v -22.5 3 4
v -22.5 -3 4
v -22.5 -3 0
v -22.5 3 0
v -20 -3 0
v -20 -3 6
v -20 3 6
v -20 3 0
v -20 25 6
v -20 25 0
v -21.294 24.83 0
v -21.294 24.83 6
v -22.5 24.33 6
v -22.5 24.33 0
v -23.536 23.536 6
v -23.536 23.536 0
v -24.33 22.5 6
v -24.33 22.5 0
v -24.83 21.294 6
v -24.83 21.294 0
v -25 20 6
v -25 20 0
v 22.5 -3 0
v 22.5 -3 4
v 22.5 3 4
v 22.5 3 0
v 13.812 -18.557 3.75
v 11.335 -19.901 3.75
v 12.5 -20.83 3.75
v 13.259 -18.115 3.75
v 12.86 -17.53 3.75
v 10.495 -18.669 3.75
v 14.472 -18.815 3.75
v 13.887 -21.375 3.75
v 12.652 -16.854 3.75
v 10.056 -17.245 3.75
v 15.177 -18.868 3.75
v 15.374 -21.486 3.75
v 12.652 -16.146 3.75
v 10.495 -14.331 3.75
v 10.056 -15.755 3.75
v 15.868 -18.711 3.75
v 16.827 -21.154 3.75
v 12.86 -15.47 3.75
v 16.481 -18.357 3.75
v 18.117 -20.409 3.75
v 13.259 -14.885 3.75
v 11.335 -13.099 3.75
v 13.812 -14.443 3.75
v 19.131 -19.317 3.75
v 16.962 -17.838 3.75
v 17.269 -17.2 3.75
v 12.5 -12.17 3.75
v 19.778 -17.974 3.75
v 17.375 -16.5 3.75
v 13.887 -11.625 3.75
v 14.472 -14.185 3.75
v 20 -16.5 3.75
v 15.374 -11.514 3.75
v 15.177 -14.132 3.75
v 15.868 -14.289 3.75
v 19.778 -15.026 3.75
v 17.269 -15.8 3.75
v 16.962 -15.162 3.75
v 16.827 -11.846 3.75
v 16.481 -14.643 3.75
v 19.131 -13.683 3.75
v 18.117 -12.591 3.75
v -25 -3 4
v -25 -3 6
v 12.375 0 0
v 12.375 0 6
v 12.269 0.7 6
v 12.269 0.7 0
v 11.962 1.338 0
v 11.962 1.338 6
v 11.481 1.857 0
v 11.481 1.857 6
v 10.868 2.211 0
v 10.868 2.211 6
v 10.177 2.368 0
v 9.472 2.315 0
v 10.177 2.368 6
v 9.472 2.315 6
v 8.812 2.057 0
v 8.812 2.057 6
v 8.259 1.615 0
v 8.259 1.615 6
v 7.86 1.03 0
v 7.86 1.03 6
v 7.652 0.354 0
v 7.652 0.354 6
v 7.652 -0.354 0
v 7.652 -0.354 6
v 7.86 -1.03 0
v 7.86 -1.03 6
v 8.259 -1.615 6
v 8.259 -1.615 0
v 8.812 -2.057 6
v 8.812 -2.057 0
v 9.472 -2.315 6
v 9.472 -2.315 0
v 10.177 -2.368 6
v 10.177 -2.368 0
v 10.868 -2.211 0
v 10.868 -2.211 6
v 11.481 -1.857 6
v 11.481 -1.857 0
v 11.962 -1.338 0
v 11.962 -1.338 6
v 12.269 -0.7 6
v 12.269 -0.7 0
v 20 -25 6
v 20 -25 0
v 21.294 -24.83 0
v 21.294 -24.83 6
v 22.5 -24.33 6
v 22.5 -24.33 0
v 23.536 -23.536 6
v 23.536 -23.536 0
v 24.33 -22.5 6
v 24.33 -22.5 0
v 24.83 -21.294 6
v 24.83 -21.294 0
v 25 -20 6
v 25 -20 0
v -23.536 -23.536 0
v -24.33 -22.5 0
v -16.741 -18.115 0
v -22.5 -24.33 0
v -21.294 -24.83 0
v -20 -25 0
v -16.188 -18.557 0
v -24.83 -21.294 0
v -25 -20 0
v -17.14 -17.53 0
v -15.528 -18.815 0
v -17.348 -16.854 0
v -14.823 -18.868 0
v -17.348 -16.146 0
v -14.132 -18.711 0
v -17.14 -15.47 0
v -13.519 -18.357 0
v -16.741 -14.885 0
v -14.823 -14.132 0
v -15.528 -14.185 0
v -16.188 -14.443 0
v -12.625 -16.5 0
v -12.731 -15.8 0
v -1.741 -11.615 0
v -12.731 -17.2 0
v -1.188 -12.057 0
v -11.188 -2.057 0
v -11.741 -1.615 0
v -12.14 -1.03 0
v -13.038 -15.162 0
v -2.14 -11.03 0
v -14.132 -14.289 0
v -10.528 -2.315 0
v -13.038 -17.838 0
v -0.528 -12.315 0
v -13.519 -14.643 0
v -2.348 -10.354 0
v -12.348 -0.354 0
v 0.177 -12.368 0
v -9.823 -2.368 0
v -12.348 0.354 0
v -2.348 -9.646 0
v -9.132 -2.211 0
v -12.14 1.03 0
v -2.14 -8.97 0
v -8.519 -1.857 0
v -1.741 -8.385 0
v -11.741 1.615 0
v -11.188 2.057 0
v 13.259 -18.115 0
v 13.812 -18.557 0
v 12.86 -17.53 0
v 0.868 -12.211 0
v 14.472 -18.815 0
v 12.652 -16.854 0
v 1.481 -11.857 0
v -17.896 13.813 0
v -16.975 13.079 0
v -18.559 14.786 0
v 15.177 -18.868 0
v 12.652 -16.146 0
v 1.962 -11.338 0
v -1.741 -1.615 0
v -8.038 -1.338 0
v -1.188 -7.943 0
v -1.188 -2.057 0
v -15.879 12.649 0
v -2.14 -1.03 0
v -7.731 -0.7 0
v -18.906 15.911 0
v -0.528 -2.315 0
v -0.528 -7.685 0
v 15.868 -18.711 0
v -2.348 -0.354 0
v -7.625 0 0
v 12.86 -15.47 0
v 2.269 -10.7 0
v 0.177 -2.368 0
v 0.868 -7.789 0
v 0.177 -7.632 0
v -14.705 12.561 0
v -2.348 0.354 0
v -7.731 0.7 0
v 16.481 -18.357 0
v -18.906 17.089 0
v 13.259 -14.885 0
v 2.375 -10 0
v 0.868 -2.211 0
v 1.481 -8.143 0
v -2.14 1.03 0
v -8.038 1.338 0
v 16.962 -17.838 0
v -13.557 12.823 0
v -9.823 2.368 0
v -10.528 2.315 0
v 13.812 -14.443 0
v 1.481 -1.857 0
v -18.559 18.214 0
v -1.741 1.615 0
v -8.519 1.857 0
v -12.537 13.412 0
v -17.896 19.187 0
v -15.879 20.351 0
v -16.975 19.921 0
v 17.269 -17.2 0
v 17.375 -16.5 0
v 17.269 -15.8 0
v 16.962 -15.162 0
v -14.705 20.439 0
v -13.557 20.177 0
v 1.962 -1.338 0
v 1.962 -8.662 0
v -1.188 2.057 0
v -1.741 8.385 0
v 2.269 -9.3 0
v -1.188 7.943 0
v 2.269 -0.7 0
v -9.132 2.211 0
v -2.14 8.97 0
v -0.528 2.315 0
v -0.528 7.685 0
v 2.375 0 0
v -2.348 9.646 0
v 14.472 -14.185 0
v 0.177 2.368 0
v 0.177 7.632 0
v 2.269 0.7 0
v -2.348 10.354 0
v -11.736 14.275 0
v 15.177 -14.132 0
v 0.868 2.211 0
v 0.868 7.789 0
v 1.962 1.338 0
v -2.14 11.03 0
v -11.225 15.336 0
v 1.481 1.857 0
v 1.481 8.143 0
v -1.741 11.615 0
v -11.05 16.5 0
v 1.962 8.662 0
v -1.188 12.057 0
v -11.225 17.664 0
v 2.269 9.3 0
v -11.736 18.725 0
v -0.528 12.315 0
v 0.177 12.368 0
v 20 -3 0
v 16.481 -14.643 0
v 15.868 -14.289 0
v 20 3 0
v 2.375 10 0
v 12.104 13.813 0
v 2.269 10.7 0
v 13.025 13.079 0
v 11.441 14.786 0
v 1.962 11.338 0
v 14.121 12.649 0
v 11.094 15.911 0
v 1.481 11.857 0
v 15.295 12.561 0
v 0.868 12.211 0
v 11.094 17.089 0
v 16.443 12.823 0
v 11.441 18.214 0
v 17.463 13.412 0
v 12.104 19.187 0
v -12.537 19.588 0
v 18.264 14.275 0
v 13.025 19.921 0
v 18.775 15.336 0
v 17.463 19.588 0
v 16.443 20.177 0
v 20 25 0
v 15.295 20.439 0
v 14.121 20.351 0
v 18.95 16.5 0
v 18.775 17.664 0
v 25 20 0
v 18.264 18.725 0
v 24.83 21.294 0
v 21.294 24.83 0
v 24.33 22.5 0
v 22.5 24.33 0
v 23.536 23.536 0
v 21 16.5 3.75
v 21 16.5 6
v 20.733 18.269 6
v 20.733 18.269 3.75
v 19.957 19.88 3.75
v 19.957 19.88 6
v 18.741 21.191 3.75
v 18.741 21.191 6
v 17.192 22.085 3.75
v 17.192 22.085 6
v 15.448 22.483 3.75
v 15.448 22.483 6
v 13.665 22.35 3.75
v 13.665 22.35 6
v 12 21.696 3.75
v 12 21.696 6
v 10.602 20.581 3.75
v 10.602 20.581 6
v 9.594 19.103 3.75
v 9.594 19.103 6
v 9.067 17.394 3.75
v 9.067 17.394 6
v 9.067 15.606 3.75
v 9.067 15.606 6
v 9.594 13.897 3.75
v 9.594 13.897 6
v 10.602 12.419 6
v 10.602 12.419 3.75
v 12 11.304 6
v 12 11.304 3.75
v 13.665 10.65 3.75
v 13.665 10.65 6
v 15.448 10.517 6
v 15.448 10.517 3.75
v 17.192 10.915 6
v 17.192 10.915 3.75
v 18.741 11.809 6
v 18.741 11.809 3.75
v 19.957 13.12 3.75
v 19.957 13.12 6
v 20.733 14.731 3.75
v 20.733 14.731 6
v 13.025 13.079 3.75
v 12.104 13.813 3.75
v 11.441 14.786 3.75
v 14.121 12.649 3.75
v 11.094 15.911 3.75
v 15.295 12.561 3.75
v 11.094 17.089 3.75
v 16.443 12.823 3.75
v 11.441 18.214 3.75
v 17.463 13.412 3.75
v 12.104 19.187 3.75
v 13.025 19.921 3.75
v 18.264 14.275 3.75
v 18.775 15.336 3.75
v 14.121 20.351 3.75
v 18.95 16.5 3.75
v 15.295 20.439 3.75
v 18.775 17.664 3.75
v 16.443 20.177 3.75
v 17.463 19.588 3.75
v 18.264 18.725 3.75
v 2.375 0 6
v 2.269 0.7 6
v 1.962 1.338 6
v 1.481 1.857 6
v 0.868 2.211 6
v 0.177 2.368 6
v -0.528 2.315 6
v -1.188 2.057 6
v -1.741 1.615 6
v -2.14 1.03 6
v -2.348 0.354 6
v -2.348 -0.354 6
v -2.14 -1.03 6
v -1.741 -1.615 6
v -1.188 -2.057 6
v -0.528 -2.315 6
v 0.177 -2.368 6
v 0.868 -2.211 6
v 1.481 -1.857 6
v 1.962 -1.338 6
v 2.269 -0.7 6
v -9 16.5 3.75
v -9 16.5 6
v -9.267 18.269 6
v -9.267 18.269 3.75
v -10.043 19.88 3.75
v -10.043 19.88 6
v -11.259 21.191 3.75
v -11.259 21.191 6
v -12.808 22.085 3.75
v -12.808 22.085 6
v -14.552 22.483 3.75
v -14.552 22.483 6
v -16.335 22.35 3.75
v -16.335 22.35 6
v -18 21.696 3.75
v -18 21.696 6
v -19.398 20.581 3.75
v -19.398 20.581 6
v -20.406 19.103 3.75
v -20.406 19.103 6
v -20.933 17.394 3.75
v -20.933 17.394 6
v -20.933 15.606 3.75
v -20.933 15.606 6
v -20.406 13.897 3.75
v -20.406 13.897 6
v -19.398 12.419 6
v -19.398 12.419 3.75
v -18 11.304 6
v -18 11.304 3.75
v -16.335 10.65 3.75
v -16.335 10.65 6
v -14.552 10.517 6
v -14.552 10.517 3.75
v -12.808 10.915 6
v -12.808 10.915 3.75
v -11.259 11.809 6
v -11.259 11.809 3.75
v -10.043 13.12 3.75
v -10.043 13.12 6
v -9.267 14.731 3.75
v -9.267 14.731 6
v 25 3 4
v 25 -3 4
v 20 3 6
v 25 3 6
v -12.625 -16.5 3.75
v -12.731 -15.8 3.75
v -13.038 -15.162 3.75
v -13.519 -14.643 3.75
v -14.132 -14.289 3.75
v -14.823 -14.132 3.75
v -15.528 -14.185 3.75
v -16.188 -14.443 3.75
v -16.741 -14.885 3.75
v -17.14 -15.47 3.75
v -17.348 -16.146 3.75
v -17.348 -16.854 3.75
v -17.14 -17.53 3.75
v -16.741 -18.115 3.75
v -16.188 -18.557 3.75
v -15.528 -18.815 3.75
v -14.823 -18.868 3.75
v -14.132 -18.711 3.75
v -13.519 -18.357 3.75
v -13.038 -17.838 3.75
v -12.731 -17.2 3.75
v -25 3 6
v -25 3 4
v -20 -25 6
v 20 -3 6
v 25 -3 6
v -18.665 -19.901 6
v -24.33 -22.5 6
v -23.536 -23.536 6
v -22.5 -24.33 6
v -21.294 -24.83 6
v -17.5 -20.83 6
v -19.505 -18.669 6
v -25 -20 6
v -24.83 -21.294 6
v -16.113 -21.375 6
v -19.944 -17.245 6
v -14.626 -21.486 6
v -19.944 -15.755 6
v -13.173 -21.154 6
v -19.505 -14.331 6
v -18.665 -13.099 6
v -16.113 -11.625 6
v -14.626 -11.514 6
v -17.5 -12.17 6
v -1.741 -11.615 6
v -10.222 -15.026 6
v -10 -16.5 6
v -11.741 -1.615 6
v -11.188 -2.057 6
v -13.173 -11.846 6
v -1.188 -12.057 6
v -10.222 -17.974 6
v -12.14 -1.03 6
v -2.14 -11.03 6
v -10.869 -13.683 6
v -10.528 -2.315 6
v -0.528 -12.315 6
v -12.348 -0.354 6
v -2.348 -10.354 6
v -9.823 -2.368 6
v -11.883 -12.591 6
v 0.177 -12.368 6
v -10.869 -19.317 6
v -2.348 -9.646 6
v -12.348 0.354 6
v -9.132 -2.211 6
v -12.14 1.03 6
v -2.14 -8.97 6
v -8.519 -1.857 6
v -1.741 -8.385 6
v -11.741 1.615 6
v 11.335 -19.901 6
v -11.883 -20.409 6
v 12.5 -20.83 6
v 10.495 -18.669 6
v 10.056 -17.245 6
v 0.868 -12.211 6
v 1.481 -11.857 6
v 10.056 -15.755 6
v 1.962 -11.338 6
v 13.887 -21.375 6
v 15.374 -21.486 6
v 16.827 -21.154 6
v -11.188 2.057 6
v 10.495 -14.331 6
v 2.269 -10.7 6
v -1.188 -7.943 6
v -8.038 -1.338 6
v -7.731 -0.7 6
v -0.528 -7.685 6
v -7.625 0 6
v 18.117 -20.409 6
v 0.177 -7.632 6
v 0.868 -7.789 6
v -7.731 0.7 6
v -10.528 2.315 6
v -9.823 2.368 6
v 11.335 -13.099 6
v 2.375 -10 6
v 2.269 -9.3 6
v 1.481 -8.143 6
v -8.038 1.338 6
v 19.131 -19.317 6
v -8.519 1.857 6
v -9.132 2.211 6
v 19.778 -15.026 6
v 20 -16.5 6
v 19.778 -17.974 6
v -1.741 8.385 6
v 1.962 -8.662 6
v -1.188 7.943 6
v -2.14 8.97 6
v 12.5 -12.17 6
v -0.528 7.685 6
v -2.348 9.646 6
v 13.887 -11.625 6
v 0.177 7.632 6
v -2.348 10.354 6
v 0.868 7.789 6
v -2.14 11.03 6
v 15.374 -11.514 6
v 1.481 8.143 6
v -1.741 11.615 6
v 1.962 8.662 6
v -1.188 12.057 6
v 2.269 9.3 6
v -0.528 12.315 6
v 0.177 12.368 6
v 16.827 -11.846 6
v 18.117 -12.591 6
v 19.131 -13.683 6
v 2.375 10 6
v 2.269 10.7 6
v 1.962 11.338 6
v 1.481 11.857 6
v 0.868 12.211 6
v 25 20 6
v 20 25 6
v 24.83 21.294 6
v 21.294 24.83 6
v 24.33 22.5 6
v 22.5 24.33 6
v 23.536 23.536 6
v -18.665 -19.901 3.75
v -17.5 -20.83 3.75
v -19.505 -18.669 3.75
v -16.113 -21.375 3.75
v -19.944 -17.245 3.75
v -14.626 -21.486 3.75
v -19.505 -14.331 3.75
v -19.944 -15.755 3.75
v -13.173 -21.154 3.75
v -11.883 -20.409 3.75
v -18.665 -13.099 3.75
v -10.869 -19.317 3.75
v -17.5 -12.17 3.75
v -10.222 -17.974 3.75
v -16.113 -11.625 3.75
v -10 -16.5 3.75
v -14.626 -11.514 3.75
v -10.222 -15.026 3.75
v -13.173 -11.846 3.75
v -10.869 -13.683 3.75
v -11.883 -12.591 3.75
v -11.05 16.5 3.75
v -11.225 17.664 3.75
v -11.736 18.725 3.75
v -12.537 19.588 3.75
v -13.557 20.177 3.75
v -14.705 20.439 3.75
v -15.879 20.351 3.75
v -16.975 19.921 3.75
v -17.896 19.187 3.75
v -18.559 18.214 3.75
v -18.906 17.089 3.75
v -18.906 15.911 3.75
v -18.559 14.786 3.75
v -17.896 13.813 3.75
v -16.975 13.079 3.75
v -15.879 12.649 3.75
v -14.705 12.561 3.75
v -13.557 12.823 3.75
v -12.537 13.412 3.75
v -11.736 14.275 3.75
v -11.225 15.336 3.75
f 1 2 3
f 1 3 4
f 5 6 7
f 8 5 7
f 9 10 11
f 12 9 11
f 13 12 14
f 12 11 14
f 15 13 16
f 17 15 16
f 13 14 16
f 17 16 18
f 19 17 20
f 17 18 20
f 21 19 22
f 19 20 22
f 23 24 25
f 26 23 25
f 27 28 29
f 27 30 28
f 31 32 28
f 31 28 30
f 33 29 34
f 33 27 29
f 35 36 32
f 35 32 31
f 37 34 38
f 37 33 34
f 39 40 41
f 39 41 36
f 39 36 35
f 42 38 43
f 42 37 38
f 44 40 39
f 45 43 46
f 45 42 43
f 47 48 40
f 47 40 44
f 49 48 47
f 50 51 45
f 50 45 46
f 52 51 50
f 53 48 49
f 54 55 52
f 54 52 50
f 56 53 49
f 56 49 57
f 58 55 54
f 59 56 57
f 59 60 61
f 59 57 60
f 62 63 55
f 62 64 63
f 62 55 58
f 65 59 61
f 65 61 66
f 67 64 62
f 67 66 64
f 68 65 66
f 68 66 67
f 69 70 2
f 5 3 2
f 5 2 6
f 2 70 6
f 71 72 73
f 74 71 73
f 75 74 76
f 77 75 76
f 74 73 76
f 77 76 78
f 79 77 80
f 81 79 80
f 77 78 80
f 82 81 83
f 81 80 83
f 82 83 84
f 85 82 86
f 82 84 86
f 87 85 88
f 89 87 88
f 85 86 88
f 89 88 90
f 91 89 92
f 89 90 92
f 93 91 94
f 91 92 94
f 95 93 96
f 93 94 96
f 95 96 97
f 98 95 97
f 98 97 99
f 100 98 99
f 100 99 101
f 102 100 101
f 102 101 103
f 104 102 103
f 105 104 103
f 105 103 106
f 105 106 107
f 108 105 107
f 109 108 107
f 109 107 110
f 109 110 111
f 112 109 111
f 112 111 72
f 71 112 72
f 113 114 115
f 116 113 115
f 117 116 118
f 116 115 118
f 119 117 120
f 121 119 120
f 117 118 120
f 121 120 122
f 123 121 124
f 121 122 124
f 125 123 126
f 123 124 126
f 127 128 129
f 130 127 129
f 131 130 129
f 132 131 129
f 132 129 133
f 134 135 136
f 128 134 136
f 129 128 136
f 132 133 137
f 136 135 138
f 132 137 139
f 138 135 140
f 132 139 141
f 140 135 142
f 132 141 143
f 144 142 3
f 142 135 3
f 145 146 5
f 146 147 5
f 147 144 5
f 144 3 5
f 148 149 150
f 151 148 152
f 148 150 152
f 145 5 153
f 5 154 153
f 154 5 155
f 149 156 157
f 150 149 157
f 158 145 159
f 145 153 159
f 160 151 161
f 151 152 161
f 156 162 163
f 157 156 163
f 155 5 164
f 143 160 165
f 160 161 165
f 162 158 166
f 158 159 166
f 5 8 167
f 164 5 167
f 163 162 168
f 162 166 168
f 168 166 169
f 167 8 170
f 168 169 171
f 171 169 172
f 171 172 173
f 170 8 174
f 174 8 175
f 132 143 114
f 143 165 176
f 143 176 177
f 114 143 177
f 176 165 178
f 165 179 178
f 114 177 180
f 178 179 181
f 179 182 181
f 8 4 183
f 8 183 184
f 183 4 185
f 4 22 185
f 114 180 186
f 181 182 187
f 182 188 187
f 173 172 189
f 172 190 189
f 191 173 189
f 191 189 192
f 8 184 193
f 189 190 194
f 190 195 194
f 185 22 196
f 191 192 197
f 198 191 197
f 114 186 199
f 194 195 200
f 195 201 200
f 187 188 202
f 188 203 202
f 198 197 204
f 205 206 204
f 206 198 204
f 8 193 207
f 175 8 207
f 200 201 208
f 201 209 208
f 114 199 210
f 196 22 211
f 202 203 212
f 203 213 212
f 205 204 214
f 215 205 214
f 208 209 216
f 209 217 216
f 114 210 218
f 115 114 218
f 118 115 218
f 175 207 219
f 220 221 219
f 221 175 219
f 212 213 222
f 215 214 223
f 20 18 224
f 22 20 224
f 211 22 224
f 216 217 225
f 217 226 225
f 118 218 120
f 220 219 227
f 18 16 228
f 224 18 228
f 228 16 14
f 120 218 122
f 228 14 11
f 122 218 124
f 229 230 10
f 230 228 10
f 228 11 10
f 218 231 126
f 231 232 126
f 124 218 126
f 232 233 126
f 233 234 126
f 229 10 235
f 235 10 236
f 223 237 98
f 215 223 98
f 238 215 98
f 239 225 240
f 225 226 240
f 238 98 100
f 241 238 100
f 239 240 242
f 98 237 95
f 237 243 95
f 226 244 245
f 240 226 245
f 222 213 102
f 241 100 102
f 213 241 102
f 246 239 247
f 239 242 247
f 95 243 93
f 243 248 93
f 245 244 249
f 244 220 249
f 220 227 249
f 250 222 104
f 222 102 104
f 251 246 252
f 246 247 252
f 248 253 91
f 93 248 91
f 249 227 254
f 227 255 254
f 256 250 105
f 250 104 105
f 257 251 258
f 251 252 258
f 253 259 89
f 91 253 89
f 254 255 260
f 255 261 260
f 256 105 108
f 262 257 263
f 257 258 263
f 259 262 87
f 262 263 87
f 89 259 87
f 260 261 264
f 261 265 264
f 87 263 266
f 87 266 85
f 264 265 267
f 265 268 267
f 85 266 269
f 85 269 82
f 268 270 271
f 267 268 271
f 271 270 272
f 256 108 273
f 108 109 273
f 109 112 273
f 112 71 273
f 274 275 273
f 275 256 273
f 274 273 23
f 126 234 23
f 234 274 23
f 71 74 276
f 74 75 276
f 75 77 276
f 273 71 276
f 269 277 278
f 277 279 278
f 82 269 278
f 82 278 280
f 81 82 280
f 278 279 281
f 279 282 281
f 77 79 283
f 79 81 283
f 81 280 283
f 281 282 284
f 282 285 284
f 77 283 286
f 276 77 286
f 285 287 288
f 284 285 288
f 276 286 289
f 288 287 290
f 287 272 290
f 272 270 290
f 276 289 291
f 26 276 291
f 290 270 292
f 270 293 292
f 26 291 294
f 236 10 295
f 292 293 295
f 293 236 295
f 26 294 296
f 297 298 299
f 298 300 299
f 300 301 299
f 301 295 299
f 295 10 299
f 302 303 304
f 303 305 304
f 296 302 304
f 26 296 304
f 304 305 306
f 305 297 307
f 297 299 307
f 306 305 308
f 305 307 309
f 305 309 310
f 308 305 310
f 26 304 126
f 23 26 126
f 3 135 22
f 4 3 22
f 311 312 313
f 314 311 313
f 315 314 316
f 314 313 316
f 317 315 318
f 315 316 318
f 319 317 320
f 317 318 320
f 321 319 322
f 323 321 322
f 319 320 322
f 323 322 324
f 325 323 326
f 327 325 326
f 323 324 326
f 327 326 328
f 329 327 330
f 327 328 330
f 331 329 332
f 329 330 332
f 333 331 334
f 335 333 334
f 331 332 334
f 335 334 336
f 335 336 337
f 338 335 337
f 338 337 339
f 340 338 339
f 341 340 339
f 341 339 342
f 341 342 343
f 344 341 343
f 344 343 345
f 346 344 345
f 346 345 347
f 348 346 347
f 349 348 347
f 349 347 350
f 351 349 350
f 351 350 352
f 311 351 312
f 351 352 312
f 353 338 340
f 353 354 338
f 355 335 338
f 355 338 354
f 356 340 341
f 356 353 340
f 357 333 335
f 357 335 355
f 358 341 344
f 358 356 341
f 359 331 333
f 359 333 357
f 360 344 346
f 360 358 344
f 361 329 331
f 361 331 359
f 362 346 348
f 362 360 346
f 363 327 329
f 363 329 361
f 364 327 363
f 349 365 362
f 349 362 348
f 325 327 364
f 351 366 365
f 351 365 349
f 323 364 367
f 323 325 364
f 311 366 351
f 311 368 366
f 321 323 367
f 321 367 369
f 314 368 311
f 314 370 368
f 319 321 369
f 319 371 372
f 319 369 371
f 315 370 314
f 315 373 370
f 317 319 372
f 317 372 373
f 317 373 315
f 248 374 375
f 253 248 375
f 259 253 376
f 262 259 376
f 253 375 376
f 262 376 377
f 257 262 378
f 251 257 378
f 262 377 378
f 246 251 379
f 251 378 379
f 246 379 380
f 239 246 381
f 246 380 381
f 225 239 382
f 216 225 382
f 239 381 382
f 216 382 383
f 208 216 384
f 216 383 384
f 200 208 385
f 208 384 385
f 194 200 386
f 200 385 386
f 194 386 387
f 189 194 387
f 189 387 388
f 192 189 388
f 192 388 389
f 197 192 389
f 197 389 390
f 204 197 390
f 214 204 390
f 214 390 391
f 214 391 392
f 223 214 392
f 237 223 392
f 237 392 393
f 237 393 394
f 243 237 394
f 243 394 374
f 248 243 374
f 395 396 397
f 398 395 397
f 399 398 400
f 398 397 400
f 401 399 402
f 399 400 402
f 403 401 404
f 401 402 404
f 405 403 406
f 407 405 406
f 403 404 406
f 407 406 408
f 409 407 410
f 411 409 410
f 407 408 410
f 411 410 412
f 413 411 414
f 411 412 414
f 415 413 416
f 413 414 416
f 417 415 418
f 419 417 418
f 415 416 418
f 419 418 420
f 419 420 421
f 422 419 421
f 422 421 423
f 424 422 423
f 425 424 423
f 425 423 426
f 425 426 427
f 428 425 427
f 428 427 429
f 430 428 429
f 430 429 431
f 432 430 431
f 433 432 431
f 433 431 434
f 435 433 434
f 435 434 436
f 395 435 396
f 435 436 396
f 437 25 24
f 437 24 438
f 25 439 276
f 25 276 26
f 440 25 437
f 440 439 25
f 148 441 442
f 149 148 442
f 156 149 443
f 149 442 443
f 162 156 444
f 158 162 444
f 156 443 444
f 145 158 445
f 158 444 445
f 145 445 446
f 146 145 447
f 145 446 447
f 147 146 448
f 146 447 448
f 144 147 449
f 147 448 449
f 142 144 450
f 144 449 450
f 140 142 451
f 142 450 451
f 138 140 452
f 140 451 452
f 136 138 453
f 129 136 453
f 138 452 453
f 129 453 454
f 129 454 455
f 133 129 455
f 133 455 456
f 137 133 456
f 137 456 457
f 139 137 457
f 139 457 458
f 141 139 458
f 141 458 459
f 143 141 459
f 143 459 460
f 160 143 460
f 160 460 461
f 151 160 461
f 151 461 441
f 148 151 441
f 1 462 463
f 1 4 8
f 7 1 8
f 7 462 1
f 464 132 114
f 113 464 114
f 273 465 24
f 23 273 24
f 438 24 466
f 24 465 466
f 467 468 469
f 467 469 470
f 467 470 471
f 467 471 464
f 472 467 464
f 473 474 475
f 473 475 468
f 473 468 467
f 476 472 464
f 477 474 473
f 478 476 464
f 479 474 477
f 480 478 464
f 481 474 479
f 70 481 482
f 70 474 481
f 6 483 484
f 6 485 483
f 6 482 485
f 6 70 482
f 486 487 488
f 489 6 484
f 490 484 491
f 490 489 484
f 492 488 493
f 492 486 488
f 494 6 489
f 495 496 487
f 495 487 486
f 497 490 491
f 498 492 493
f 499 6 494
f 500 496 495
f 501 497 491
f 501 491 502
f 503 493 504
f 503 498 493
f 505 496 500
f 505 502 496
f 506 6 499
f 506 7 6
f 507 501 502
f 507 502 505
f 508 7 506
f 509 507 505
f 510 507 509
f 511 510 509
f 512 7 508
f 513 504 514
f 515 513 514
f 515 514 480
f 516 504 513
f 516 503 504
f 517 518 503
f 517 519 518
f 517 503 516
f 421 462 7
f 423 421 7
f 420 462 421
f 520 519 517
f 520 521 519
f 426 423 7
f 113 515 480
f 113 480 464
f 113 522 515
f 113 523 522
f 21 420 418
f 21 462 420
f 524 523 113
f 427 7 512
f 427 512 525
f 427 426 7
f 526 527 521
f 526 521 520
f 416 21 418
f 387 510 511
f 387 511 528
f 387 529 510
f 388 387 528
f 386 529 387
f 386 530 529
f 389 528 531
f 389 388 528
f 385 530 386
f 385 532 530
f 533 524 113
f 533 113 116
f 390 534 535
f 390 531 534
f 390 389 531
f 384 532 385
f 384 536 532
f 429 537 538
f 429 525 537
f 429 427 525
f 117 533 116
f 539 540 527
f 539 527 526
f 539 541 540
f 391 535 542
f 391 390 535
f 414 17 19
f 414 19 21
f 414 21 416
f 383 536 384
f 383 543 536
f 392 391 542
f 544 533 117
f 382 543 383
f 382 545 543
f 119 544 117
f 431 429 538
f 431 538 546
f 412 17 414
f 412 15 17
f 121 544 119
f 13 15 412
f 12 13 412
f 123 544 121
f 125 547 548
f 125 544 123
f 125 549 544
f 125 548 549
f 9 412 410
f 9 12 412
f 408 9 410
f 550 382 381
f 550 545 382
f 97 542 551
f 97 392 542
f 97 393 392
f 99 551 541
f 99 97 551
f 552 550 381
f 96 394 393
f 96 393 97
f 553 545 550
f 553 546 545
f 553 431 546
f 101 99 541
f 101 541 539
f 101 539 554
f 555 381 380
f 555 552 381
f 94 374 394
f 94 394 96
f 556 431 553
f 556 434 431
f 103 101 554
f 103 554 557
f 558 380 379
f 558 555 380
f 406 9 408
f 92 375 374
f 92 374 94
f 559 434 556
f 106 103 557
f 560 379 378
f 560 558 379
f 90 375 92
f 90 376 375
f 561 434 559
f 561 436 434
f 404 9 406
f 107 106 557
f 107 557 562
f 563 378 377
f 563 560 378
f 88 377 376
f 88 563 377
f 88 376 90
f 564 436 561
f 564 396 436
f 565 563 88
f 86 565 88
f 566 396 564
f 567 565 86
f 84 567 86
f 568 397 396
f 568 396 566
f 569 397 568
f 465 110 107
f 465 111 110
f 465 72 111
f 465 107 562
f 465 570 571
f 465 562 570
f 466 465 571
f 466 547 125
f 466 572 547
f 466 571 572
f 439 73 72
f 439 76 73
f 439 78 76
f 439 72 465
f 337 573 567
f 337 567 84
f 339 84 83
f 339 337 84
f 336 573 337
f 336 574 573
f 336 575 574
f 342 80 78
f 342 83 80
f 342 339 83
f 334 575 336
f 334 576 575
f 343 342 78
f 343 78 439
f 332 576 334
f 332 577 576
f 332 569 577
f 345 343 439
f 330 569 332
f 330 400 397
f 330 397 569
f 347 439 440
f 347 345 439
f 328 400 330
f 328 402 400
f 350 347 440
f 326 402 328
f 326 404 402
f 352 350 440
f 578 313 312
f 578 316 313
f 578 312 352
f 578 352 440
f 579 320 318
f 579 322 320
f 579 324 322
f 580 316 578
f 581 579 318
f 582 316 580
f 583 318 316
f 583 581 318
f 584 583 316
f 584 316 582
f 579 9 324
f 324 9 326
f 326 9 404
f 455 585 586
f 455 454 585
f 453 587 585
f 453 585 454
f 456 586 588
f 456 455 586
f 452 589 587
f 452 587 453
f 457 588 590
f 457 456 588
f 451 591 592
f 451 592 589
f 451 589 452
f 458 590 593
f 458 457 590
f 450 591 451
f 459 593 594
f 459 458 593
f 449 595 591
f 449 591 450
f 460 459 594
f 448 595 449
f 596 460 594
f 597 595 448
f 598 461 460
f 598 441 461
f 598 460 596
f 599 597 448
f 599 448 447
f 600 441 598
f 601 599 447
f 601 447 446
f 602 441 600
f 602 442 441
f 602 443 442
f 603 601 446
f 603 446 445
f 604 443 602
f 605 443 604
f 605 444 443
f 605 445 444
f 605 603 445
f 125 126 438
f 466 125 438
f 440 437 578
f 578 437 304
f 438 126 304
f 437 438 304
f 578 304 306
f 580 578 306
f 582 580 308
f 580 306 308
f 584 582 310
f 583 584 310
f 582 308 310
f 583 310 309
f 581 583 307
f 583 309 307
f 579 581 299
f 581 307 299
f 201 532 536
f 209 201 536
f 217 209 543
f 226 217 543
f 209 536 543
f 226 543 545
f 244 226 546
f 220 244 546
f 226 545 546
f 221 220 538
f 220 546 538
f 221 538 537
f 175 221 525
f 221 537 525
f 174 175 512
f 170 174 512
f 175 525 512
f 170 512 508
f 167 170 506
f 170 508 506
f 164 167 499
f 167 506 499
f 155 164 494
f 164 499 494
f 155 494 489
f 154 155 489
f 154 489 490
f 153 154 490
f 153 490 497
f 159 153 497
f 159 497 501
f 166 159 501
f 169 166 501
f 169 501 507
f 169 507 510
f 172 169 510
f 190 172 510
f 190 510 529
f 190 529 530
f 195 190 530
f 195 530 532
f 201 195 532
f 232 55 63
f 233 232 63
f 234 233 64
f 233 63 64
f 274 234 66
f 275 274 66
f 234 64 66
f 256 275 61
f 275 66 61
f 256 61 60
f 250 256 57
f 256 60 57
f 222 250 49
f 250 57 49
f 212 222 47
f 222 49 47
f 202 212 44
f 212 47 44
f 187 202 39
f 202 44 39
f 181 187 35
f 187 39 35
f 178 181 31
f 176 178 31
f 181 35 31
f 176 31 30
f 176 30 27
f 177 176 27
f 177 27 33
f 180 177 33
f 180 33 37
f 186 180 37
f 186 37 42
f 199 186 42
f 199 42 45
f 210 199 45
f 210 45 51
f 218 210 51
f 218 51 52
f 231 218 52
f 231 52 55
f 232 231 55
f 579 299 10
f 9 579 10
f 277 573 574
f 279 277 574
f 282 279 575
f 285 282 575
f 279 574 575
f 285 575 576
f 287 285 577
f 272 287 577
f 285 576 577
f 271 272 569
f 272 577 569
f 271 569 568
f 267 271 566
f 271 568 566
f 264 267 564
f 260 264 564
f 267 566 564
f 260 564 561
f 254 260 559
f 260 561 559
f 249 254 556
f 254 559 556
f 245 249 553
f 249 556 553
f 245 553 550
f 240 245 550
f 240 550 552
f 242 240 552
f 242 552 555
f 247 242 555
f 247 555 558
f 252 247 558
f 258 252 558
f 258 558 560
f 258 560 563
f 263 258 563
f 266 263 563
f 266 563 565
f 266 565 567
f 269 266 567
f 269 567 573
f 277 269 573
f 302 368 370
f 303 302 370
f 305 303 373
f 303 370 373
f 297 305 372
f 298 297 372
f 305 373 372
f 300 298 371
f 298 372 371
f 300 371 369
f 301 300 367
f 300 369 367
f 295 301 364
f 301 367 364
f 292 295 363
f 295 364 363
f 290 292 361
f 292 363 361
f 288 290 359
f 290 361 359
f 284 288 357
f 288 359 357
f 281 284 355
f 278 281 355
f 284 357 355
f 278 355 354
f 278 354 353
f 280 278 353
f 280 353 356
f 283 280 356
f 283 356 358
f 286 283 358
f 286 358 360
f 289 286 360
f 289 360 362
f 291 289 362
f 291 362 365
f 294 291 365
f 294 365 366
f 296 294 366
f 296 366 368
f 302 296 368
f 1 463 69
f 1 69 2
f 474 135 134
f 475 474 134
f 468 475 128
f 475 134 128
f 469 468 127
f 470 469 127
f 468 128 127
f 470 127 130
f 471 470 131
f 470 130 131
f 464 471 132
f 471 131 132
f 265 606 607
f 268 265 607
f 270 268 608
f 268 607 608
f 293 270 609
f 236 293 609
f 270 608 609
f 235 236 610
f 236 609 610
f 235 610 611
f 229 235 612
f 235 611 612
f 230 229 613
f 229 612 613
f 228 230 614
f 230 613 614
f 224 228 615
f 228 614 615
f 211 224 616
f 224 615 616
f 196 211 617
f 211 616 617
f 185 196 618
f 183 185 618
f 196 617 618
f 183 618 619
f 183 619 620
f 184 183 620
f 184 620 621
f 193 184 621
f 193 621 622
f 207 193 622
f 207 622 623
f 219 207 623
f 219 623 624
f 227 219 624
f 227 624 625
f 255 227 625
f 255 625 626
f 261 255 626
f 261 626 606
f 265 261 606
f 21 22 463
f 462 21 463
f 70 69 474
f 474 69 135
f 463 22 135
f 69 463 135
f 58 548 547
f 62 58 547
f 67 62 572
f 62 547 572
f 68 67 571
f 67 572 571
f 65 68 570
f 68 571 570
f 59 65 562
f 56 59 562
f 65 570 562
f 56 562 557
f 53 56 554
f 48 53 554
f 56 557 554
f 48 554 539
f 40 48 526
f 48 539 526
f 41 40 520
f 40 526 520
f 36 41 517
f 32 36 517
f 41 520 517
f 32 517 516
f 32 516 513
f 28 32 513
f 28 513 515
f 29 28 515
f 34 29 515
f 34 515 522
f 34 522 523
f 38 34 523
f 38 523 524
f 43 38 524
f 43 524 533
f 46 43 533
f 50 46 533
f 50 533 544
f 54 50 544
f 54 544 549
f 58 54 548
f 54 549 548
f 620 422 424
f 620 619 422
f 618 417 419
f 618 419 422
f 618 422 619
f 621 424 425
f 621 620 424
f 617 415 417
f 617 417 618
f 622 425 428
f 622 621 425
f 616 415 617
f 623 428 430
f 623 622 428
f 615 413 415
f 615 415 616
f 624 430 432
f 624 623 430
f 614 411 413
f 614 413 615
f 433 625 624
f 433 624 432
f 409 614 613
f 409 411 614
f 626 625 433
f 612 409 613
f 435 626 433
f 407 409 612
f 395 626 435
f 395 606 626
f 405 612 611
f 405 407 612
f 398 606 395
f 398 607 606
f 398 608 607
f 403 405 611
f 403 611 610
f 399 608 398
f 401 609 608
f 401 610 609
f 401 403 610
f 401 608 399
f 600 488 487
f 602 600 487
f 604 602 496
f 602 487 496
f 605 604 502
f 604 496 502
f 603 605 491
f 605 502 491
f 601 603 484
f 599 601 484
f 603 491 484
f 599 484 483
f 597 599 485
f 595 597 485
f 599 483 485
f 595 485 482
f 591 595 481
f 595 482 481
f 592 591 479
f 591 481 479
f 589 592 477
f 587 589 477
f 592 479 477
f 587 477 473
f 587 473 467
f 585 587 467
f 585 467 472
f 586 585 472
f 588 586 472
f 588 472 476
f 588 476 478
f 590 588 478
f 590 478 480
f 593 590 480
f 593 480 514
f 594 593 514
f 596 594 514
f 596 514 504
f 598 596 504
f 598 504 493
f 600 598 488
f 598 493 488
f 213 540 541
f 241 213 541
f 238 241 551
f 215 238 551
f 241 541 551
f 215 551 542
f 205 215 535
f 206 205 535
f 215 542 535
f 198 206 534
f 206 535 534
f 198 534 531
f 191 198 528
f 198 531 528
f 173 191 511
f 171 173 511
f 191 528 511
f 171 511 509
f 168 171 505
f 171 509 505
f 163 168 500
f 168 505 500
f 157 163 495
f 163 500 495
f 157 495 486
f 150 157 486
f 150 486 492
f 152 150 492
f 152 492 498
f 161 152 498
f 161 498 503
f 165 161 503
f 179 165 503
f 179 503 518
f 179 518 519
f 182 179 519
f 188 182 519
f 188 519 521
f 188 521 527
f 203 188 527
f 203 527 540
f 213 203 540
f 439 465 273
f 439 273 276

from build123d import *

# Parameters (mm, degrees)
F1_DEPTH  = 6
F2_W      = 2.5
F2_H      = 6
F3_DEPTH  = 2
F4_W      = 2.5
F4_H      = 6
F5_DEPTH  = 25
F6_R      = 2.375
F7_DEPTH  = 25
F8_R      = 2.375
F9_DEPTH  = 25
F10_R     = 6
F10_R_2   = 5
F11_DEPTH = 2.25
F12_R     = 3.95
F13_DEPTH = 25


with BuildPart() as f1:
    # F0 (on Top) → F1 (new body)
    with BuildSketch(Plane.XY):
        with BuildLine():
            ThreePointArc((-25, -20), (-23.535534, -23.535534), (-20, -25))
            Line((-20, -25), (20, -25))
            ThreePointArc((20, -25), (23.535534, -23.535534), (25, -20))
            Line((25, -20), (25, 20))
            ThreePointArc((25, 20), (23.535534, 23.535534), (20, 25))
            Line((20, 25), (-20, 25))
            ThreePointArc((-20, 25), (-23.535534, 23.535534), (-25, 20))
            Line((-25, 20), (-25, -20))
        make_face()
    extrude(amount=F1_DEPTH)

    # F2 (on face) → F3 (cut)
    with BuildSketch(Plane.XY.offset(6)):
        with Locations((-23.75, 0)):
            Rectangle(F2_W, F2_H)
        with Locations((23.75, 0)):
            Rectangle(F2_W, F2_H)
    extrude(amount=-F3_DEPTH, mode=Mode.SUBTRACT)

    # F4 (on face) → F5 (cut)
    with BuildSketch(Plane.XY.offset(6)):
        with Locations((-21.25, 0)):
            Rectangle(F4_W, F4_H)
        with Locations((21.25, 0)):
            Rectangle(F4_W, F4_H)
    extrude(amount=-F5_DEPTH, mode=Mode.SUBTRACT)

    # F6 (on face) → F7 (cut)
    with BuildSketch(Plane.XY.offset(6)):
        Circle(F6_R)
        with Locations((-10, 0)):
            Circle(F6_R)
        with Locations((0, -10)):
            Circle(F6_R)
        with Locations((10, 0)):
            Circle(F6_R)
        with Locations((0, 10)):
            Circle(F6_R)
    extrude(amount=-F7_DEPTH, mode=Mode.SUBTRACT)

    # F8 (on face) → F9 (cut)
    with BuildSketch(Plane.XY.offset(6)):
        with Locations((-15, -16.5)):
            Circle(F8_R)
        with Locations((15, -16.5)):
            Circle(F8_R)
        with Locations((-15, 16.5)):
            Circle(F8_R)
        with Locations((15, 16.5)):
            Circle(F8_R)
    extrude(amount=-F9_DEPTH, mode=Mode.SUBTRACT)

    # F10 (on face) → F11 (cut)
    with BuildSketch(Plane.XY.offset(6)):
        with Locations((-15, 16.5)):
            Circle(F10_R)
        with Locations((15, 16.5)):
            Circle(F10_R)
        with Locations((-15, -16.5)):
            Circle(F10_R_2)
        with Locations((15, -16.5)):
            Circle(F10_R_2)
    extrude(amount=-F11_DEPTH, mode=Mode.SUBTRACT)

    # F12 (on face) → F13 (cut)
    with BuildSketch(Plane.XY.offset(3.75)):
        with Locations((-15, 16.5)):
            Circle(F12_R)
        with Locations((15, 16.5)):
            Circle(F12_R)
    extrude(amount=-F13_DEPTH, mode=Mode.SUBTRACT)


solid = f1.part
